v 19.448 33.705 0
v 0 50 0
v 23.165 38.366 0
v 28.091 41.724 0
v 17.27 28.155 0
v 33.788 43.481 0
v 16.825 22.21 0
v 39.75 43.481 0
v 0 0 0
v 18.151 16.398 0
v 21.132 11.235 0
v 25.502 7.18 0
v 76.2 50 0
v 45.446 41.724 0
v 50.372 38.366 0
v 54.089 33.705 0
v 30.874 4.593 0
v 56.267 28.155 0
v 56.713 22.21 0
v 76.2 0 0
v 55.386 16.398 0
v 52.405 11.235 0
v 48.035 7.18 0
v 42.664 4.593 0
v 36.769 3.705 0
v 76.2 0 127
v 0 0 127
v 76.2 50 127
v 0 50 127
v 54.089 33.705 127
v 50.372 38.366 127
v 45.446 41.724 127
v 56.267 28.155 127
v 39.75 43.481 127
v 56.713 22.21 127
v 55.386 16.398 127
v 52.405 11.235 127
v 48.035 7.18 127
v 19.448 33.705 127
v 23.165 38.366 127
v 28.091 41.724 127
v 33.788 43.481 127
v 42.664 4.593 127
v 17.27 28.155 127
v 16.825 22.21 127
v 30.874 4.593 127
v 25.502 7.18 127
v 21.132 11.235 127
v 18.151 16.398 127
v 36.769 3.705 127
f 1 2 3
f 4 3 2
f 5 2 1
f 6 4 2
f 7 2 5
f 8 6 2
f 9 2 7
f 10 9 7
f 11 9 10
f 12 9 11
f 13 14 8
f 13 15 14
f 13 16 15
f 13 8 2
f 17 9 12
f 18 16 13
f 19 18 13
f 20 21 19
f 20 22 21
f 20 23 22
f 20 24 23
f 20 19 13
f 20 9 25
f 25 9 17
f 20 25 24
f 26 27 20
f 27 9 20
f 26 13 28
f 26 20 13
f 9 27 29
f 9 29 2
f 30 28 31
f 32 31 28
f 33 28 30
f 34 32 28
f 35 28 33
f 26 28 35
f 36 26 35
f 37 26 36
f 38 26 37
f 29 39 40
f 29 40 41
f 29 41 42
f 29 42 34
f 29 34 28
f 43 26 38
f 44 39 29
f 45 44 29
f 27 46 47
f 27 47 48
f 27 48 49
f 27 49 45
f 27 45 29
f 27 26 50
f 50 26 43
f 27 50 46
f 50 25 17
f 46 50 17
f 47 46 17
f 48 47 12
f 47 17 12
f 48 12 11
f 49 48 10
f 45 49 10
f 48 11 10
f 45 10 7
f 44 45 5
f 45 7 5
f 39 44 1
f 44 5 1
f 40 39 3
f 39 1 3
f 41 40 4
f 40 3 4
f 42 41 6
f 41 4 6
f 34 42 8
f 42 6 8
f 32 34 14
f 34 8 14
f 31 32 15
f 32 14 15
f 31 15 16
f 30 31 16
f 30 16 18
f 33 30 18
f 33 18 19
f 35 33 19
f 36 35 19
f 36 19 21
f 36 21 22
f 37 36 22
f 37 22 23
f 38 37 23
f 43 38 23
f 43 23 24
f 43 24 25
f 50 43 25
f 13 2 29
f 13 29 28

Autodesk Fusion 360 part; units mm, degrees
sketch "Sketch1" plane through (0, 0, 0) normal (0, 1, 0) x (1, 0, 0)
  line L0 (0, 0) -> (76.2, 0)
  line L1 (76.2, 0) -> (76.2, -203.2)
  line L2 (76.2, -203.2) -> (0, -203.2)
  line L3 (0, -203.2) -> (0, 0)
  dimension "d1" = 76.2
  dimension "d2" = 203.2
extrude "Extrude1" add sketch "Sketch1" along normal blind 50
hole "Hole1" at (36.7688, 23.7048, 203.2) direction (0, 0, -1) diameter 40 end through all
sketch "Sketch2" plane through (0, 50, 0) normal (0, 1, 0) x (-1, 0, 0)
  line L0 (0, 203.2) -> (-76.2, 203.2)
  line L1 (-76.2, 203.2) -> (-76.2, 0)
  line L2 (-76.2, 0) -> (0, 0)
  line L3 (0, 0) -> (0, 203.2)
  line L4 (150, 0) -> (73.8, 0)
  line L5 (73.8, 0) -> (73.8, 127)
  line L6 (73.8, 127) -> (150, 127)
  line L7 (150, 127) -> (150, 0)
  dimension "d8" = 76.2
  dimension "d9" = 127
sketch "Sketch3" plane through (0, 0, 0) normal (0, 1, 0) x (1, 0, 0)
  line L0 (79.4367, 34.7313) -> (3.2367, 34.7313)
  line L1 (3.2367, 34.7313) -> (3.2367, 237.9313)
  line L2 (3.2367, 237.9313) -> (79.4367, 237.9313)
  line L3 (79.4367, 237.9313) -> (79.4367, 34.7313)
  dimension "d13" = 76.2
  dimension "d14" = 203.2
move_face "OffsetFaces1" offset -76.2 1 faces at (69.7043, 25.0665, 203.2)
